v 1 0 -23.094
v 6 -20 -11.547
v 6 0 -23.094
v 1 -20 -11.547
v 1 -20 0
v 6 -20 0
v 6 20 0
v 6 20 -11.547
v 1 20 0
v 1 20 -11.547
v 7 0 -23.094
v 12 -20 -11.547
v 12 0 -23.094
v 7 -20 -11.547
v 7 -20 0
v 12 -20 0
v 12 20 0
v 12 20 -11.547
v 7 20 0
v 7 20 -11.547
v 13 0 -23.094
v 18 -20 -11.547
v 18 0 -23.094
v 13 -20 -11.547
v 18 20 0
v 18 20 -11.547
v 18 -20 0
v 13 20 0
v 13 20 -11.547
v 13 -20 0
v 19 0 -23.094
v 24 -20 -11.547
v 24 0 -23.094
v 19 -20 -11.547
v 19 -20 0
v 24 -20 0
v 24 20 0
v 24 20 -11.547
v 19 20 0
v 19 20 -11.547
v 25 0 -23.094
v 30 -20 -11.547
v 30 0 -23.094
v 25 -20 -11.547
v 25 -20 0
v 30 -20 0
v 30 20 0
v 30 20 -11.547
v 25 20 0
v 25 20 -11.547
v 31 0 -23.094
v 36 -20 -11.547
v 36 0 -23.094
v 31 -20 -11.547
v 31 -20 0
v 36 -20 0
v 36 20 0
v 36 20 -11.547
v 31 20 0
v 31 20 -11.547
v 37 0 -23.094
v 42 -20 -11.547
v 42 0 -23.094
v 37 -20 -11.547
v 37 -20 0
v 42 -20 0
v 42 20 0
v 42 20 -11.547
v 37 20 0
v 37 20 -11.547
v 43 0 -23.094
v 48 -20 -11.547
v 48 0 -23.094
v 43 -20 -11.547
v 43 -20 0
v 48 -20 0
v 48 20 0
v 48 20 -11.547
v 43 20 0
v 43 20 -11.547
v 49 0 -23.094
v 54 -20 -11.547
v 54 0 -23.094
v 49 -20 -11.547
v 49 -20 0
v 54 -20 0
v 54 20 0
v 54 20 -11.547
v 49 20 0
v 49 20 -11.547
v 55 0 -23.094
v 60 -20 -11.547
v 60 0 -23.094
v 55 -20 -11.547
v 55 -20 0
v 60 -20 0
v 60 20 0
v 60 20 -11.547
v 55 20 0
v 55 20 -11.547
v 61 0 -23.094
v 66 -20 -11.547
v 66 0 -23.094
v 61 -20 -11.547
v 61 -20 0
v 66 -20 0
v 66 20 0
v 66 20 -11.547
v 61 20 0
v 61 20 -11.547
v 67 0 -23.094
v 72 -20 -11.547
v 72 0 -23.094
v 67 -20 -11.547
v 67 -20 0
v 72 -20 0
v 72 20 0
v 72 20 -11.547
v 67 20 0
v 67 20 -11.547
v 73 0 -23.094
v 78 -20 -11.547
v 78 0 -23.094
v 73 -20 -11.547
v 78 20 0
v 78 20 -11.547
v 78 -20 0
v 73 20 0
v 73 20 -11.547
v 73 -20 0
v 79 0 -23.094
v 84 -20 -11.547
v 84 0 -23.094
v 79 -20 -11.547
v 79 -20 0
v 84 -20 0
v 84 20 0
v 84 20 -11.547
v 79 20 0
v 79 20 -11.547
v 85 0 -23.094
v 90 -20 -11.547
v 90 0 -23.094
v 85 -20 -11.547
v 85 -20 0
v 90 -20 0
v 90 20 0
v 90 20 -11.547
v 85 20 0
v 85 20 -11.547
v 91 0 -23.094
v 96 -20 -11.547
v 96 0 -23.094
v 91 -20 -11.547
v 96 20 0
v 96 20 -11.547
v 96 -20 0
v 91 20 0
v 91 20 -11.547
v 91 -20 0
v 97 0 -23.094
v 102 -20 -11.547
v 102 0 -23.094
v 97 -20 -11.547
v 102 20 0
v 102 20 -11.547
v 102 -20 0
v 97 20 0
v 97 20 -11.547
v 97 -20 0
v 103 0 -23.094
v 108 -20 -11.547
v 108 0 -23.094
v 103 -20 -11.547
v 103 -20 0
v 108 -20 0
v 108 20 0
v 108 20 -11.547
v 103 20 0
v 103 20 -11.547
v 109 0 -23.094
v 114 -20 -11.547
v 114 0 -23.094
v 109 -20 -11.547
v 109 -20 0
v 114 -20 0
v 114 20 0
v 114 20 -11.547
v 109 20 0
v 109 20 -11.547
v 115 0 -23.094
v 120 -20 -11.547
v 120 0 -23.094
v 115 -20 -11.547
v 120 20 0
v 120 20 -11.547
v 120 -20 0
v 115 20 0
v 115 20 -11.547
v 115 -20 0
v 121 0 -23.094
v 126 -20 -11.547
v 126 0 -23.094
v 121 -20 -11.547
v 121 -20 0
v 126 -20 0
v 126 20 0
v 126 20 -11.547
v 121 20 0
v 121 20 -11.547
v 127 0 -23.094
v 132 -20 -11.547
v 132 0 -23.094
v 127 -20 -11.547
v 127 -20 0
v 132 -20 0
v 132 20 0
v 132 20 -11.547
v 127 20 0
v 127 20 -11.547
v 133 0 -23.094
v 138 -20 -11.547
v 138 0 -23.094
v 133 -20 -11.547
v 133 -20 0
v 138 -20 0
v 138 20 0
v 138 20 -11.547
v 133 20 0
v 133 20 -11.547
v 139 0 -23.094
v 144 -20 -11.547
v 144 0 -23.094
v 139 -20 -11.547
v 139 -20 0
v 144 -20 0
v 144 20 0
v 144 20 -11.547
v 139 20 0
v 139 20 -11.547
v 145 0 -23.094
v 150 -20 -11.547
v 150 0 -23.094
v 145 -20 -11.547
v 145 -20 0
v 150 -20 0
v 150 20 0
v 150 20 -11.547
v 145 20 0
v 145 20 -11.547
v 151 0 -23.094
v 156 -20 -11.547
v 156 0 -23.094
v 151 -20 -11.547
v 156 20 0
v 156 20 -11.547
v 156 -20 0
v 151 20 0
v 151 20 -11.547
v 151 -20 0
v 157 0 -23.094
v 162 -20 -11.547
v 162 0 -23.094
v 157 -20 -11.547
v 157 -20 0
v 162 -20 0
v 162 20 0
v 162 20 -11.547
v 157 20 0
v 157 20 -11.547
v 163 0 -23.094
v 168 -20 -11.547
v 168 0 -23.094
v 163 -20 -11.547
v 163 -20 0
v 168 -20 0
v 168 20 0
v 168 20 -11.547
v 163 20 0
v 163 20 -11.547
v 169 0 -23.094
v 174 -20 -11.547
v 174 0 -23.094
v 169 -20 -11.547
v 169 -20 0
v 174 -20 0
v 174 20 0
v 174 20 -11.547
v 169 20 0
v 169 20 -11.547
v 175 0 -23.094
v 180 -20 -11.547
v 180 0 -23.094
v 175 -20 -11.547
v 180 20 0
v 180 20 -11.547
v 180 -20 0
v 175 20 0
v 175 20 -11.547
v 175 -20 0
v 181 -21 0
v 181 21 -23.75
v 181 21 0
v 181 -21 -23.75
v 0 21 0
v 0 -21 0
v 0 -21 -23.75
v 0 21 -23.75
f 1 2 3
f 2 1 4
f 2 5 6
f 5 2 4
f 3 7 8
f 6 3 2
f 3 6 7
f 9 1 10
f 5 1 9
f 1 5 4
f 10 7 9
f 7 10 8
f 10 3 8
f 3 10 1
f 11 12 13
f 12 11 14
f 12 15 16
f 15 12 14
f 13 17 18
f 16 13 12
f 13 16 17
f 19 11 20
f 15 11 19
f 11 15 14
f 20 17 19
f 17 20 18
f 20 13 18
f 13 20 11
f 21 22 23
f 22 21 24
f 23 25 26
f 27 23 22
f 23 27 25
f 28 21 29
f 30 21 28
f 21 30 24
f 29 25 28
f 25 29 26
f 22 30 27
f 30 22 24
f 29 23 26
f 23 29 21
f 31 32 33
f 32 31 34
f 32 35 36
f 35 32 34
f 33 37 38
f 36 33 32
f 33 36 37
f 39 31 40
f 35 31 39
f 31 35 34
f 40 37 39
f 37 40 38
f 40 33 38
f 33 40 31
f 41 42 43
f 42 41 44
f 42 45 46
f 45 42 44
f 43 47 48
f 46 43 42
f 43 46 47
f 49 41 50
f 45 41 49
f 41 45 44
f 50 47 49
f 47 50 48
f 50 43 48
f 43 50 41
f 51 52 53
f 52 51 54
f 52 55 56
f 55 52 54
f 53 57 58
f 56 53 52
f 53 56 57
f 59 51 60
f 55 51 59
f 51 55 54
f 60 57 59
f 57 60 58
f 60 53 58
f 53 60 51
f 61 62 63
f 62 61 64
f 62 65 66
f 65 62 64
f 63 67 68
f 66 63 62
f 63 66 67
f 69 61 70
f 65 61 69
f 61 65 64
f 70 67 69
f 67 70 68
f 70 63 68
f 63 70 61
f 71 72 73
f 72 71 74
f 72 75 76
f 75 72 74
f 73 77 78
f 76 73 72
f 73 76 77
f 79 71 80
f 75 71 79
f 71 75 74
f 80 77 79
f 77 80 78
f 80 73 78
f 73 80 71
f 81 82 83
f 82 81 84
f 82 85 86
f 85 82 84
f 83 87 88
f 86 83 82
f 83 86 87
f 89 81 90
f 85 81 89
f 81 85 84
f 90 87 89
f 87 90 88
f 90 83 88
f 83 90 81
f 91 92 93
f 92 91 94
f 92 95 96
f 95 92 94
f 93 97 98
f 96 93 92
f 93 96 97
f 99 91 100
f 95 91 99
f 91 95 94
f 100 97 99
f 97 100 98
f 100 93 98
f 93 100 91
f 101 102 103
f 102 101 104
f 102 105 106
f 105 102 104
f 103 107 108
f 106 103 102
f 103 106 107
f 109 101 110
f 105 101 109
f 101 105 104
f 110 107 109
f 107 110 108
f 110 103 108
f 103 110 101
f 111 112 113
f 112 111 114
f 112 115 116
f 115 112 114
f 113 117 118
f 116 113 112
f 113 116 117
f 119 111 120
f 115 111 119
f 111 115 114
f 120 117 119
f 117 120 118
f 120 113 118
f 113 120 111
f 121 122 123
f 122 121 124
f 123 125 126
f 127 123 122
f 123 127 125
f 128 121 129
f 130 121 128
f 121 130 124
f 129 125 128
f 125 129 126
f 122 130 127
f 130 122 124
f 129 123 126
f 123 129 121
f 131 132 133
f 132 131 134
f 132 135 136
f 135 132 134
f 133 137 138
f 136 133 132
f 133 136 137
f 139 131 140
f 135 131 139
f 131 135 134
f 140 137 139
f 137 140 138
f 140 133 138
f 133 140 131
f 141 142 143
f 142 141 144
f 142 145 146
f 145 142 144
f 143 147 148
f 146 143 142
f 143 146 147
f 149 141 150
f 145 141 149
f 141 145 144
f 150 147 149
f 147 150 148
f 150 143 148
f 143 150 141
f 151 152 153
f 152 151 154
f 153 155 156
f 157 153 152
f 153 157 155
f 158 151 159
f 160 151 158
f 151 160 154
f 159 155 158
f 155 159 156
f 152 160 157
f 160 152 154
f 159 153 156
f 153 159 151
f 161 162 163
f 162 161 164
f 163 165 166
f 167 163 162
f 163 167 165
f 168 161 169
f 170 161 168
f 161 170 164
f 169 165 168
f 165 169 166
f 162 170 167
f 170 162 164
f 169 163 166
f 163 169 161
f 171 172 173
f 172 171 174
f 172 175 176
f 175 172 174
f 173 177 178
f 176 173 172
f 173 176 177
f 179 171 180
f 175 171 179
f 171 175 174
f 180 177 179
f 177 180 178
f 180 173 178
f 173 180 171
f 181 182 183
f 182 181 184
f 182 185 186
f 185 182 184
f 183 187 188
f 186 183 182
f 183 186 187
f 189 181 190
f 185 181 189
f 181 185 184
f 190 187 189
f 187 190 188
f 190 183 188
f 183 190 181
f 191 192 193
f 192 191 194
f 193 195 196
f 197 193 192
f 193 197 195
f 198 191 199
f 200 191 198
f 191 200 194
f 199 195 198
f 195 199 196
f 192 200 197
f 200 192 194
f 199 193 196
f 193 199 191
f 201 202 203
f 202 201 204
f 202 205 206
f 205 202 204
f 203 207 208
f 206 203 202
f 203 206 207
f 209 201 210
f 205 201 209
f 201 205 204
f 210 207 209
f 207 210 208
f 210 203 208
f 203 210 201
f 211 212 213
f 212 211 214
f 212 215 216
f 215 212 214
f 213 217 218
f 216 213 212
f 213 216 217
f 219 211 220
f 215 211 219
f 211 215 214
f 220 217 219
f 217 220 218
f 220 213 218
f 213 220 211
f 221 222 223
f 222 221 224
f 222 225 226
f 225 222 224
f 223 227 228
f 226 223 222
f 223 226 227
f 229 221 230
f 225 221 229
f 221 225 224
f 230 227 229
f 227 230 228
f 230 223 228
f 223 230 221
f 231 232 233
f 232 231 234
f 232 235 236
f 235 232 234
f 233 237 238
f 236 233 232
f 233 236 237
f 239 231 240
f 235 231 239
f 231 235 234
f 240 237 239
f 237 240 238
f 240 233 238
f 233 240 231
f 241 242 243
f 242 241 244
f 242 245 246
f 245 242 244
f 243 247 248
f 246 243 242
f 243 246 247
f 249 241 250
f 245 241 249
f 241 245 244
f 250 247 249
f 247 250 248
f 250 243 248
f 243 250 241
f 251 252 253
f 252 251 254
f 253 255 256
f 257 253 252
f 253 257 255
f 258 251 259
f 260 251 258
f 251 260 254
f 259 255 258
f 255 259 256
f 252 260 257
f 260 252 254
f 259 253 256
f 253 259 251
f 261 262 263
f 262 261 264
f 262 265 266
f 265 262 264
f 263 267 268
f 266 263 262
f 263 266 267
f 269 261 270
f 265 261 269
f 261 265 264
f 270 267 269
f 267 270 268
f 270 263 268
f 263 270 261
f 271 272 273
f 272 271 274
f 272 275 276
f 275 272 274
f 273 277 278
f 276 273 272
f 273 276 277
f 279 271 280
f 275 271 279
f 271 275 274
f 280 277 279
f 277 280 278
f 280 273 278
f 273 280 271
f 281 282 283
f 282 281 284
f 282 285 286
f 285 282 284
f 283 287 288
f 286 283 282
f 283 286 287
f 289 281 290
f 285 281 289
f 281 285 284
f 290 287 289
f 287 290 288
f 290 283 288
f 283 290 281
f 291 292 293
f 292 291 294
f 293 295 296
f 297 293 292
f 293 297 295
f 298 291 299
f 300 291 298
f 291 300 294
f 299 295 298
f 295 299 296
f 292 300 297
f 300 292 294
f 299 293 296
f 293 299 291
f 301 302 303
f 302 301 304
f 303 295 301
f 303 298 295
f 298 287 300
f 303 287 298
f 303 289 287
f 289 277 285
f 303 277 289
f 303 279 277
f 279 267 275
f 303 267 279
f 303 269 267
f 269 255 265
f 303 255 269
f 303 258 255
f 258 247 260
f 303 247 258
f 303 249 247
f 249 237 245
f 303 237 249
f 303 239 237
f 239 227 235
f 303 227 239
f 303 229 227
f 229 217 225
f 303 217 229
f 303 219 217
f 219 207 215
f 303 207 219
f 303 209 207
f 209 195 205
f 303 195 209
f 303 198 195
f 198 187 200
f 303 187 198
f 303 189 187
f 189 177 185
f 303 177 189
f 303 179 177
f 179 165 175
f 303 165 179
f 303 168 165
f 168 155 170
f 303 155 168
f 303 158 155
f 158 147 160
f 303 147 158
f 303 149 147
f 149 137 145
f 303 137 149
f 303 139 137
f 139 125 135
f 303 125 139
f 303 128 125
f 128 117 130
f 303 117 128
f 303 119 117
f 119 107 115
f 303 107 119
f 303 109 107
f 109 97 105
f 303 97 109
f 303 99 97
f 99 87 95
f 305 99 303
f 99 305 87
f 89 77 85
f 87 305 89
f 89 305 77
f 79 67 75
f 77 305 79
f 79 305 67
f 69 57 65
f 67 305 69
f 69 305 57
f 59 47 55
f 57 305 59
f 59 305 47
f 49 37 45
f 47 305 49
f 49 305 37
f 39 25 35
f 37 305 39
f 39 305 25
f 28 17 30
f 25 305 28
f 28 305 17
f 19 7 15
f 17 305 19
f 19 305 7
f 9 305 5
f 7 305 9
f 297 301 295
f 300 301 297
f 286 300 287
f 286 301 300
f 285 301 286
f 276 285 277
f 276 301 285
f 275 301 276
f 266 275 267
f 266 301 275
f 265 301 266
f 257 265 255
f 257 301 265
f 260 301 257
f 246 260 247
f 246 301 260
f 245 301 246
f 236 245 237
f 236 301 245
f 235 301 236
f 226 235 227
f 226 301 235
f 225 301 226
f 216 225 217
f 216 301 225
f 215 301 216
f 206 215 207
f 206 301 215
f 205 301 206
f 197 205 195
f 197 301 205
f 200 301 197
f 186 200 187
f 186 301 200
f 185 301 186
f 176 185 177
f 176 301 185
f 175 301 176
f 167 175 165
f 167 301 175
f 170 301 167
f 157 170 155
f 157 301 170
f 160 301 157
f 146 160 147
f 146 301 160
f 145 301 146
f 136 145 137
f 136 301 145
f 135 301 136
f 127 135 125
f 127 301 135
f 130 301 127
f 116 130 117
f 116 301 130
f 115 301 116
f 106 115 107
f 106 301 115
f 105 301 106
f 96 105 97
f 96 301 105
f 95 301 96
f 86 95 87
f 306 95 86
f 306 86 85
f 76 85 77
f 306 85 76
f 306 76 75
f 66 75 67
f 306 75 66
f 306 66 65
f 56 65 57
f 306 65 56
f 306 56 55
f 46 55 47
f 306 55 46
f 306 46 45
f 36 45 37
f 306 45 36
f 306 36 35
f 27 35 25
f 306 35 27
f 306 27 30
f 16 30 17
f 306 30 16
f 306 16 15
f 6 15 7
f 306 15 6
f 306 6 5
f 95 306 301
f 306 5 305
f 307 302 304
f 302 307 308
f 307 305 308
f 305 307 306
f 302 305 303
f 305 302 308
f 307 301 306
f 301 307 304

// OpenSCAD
include <18xx tiles basic functions.scad>
// 30 pcs means 181 mm long
hexes=30;
yt=hex_size+4*width;
zt=1.25*hex_size;
difference() {
    translate([0,-yt,-zt]) cube([6*hexes+1,2*yt,zt]);
    for(i=[0:(hexes-1)]){
            translate([1+i*6,0,0]) rotate([0,90,0]) linear_extrude(5) regular_polygon(6,hex_size+2*width);
    }
}    
